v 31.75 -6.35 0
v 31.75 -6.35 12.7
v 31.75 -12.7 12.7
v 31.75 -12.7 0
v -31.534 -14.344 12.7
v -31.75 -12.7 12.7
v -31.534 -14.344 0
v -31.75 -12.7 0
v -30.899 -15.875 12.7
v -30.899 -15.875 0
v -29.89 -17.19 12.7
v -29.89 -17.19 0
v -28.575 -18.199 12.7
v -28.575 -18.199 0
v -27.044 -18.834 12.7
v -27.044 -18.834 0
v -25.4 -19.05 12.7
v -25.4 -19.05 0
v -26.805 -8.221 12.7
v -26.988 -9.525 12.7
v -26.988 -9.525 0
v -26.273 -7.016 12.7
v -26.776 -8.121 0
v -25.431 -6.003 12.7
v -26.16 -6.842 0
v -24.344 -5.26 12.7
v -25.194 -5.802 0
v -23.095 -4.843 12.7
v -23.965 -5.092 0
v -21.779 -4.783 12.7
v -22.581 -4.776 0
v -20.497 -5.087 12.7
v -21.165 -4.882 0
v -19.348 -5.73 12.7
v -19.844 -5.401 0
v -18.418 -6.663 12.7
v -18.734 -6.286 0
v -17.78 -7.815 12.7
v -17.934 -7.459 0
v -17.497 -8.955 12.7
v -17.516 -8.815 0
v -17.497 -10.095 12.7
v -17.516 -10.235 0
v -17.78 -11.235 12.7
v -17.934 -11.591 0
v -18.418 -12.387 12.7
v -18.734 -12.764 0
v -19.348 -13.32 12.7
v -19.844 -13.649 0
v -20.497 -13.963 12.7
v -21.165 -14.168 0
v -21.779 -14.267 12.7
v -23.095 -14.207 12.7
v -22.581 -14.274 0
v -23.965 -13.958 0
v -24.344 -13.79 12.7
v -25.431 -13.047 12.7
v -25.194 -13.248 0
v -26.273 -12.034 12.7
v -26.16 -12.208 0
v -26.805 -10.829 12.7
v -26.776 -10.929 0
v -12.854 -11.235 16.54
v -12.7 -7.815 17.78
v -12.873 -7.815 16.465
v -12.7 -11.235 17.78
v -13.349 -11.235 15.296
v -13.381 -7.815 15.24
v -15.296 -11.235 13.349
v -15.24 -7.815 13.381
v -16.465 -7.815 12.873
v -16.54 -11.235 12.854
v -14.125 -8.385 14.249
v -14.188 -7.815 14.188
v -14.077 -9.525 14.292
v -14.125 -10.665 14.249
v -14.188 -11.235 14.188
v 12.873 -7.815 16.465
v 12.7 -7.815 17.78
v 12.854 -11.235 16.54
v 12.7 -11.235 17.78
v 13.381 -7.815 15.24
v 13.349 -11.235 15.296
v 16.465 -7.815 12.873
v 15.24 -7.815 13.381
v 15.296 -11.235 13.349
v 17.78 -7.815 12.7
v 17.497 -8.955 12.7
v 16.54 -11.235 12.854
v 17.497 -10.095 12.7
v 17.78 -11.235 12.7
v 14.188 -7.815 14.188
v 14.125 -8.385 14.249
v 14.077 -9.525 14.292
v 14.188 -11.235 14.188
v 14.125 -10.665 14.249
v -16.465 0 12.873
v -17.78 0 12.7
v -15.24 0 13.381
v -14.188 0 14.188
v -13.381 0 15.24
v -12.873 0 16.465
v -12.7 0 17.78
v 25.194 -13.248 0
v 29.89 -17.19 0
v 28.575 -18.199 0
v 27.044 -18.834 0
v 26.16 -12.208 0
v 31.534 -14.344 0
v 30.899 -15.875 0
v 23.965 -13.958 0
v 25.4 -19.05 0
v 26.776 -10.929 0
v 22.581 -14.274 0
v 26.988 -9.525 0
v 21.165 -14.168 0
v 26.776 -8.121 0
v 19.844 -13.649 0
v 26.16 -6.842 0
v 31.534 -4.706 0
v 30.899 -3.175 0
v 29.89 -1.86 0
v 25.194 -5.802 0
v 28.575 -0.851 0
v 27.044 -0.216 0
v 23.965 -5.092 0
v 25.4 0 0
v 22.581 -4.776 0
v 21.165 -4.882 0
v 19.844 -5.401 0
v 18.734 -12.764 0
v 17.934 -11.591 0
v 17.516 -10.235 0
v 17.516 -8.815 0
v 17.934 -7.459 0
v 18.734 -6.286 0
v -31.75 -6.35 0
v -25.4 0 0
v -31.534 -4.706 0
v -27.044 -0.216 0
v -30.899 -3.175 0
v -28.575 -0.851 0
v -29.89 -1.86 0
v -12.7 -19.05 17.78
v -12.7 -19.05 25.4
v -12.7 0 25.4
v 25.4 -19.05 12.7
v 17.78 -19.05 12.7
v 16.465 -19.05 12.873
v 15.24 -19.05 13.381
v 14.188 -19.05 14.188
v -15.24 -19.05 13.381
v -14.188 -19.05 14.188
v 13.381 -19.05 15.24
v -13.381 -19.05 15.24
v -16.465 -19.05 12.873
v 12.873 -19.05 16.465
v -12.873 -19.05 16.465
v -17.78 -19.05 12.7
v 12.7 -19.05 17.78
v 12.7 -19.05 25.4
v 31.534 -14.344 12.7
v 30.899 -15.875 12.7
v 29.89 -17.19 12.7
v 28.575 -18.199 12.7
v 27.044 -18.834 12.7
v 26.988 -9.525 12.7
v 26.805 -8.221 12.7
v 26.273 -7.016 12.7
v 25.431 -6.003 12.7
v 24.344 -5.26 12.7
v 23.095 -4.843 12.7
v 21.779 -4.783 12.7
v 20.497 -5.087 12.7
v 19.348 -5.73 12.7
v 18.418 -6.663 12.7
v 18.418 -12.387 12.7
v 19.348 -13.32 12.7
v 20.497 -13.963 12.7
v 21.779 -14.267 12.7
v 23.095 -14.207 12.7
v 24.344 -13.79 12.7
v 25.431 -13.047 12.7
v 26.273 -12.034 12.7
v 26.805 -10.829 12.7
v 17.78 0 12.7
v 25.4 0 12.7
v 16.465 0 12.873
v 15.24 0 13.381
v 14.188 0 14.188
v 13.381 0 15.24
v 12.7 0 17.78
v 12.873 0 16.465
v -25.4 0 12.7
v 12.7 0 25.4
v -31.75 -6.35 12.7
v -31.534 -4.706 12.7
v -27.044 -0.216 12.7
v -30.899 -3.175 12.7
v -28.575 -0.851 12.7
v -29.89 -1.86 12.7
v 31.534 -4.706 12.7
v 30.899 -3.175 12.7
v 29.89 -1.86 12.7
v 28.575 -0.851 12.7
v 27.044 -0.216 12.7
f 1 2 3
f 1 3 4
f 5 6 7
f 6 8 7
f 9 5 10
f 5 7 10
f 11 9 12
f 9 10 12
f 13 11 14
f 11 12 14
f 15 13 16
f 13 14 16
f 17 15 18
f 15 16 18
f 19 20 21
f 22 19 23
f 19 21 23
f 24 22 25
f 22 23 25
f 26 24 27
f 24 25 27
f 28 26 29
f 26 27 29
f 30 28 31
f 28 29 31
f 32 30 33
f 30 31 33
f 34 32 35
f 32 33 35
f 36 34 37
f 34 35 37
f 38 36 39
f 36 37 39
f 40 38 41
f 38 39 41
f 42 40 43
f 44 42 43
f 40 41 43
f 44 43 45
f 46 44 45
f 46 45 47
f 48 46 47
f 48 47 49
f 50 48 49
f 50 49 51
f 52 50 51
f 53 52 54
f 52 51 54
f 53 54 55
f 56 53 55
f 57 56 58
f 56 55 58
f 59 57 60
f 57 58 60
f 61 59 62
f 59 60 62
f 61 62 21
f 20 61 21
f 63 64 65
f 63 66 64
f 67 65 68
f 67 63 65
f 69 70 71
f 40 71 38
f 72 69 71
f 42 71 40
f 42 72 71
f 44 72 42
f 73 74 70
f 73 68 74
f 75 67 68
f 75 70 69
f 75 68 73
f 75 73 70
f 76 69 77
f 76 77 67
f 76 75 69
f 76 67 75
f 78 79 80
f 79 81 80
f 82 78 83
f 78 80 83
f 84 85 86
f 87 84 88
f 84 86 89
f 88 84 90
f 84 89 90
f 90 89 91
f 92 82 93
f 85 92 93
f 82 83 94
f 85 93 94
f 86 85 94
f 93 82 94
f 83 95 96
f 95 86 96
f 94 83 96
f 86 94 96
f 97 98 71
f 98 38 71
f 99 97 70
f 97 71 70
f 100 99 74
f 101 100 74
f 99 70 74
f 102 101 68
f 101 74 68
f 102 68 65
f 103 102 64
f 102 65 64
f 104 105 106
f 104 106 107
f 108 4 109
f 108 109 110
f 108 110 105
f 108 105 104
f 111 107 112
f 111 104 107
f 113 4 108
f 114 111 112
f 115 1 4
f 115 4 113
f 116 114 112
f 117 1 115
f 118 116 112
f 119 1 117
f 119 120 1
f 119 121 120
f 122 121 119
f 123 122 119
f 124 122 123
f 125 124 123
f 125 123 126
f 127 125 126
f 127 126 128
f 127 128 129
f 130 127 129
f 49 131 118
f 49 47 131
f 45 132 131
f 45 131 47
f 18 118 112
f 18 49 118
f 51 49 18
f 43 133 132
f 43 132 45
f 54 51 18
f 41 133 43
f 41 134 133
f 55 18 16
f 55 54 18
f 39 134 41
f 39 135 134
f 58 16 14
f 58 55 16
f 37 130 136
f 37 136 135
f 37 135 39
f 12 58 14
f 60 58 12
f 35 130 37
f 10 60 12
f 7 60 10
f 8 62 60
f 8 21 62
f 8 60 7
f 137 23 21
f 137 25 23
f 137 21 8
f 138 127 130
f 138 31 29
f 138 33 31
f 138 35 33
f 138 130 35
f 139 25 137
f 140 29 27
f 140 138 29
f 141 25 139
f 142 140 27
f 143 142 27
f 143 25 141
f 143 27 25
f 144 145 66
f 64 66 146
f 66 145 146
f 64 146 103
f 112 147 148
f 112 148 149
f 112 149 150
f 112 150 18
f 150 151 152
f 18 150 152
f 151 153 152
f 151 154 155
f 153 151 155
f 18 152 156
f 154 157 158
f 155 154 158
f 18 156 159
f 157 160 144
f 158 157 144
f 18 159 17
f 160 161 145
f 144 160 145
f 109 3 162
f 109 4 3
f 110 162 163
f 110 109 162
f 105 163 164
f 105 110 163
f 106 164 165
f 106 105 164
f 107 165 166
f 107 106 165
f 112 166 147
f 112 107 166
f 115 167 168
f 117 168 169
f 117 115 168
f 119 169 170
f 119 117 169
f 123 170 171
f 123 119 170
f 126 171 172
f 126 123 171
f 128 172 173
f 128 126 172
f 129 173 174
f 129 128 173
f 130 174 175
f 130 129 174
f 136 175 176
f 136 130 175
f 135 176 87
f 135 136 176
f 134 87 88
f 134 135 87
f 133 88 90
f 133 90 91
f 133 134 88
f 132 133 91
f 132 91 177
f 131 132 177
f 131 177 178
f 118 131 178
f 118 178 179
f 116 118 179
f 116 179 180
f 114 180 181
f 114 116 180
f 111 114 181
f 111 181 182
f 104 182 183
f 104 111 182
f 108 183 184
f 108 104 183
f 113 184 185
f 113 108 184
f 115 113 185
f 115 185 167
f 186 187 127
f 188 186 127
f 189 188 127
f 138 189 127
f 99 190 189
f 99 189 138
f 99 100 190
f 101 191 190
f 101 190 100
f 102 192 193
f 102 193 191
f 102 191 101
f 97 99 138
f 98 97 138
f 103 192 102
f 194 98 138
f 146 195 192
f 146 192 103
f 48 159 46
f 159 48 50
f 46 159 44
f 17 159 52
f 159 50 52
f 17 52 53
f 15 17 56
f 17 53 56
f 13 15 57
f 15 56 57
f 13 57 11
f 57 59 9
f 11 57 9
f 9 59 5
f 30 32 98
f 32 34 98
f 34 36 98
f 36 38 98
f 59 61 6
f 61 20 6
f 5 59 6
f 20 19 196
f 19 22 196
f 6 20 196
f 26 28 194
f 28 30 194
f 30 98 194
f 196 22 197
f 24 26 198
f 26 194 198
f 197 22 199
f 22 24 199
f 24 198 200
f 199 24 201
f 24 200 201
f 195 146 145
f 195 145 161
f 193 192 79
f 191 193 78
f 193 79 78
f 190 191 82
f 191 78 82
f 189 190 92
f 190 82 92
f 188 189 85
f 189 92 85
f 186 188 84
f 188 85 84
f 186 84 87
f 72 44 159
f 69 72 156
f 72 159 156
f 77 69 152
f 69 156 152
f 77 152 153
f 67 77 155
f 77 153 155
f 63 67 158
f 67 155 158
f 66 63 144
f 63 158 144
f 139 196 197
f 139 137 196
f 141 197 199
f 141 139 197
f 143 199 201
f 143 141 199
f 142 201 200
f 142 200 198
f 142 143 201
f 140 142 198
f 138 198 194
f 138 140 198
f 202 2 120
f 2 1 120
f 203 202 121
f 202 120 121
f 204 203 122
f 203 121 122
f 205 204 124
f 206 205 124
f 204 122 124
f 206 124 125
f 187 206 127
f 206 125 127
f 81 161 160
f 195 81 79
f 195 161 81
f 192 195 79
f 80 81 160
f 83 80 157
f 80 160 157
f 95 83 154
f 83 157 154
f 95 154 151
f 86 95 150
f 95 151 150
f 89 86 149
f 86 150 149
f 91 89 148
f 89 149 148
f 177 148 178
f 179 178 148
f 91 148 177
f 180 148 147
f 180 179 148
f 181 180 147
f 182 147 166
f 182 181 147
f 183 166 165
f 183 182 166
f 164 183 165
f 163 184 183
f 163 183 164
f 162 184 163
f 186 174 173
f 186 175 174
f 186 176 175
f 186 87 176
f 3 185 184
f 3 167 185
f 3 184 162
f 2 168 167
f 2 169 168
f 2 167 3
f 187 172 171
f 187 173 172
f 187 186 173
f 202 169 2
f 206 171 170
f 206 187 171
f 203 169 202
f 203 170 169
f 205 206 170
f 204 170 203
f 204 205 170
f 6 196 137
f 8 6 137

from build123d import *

# Parameters (mm, degrees)
F1_DEPTH = 19.05
F3_D     = 9.525
F4_R     = 6.35
F6_R     = 5.08


with BuildPart() as f1:
    # F0 (on Front) → F1 (new body)
    with BuildSketch(Plane.XZ):
        Polygon((-31.75, 0), (0, 0), (0, 25.4), (-12.7, 25.4), (-12.7, 12.7), (-31.75, 12.7), align=None)
    extrude(amount=F1_DEPTH)

    # F3 (through all)
    with Locations(Plane.XY.offset(12.7)):
        with Locations((-22.225, -9.525)):
            Hole(F3_D / 2)

    # F4
    f4_edges = [f1.edges().sort_by_distance(p)[0] for p in [
        (-31.75, -19.05, 6.35),
        (-31.75, 0, 6.35),
    ]]
    fillet(f4_edges, radius=F4_R)

    # F5: F1 across face


with BuildPart() as f1_1:
    add(f1.part)
    add(f1.part.mirror(Plane(origin=(0, -9.525, 12.7), x_dir=(0, 1, 0), z_dir=(1, 0, 0))))

    # F6
    f6_edges = [f1_1.edges().sort_by_distance(p)[0] for p in [
        (-12.7, -9.525, 12.7),
        (12.7, -9.525, 12.7),
    ]]
    fillet(f6_edges, radius=F6_R)


solid = f1_1.part
